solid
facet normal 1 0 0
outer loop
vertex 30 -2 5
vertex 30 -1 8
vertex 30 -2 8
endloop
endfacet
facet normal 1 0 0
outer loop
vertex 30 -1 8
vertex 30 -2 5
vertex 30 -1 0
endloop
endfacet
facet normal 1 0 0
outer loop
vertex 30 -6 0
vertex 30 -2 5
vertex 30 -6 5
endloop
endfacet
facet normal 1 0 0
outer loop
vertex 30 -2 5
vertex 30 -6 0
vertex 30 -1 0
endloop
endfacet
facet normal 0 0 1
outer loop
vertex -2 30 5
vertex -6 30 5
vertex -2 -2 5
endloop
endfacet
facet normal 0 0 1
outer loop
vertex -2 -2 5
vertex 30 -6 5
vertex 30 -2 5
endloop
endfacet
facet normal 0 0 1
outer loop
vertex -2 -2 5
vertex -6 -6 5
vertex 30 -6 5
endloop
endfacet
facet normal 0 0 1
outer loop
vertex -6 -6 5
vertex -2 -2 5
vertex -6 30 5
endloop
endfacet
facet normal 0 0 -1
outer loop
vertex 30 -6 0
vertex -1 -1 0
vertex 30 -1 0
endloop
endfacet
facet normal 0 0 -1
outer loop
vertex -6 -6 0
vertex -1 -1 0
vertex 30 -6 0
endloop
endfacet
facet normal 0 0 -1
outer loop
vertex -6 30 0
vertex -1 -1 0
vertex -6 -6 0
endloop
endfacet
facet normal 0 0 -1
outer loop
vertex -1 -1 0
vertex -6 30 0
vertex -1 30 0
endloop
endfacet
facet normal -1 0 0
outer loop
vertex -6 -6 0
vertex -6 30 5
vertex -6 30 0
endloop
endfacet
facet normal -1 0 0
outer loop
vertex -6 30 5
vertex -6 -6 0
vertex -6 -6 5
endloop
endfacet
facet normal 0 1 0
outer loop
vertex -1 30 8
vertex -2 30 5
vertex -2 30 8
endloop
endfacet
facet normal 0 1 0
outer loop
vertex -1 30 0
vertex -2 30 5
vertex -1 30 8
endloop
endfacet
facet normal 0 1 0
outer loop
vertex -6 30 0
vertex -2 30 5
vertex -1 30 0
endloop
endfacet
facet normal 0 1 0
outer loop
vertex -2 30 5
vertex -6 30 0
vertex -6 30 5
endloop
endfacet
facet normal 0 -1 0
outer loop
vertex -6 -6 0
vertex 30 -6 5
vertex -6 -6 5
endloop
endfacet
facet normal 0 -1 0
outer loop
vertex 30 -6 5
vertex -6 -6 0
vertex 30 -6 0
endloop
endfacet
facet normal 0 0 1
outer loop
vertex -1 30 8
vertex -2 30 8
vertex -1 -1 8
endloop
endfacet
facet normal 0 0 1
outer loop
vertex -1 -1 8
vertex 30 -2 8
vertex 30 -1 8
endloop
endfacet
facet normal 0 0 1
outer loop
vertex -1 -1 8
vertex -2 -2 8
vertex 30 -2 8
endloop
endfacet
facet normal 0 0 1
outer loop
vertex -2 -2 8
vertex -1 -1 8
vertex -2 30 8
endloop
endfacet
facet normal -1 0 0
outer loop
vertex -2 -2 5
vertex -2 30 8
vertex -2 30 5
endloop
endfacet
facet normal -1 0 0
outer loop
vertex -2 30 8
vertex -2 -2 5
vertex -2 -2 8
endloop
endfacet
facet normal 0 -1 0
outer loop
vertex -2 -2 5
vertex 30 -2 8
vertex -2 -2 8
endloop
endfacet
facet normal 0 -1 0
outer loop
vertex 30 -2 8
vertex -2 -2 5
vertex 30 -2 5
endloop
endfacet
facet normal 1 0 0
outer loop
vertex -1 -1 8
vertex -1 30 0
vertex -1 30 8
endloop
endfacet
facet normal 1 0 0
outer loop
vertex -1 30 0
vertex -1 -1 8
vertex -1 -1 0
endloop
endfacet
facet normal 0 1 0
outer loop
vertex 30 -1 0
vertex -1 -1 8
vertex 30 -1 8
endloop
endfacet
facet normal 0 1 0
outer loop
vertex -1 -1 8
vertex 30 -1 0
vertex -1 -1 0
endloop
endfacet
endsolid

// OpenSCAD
// file: Mendel90.scad
//
// QP_OpenSCAD_lib
//
// GNU GPL v3
// quackingplums@gmail.com
//
// Mendel90 dimensions, etc
//

IKEA_SORLI = ["IKEA SÖRLI", 196, 196, 18];

function build_plate_name(build_plate) = build_plate[0];
function build_plate_x(build_plate) = build_plate[1];		// width
function build_plate_y(build_plate) = build_plate[2];		// depth
function build_plate_cr(build_plate) = build_plate[3];		// corner radius

default_build_plate = IKEA_SORLI;

function max_width(build_plate = default_build_plate) = 
	build_plate_x(build_plate);

function max_depth(build_plate = default_build_plate) = 
	build_plate_y(build_plate);

function max_diagonal(build_plate = default_build_plate) = 
	sqrt(
		pow(build_plate_x(build_plate) - 2*build_plate_cr(build_plate), 2) +
		pow(build_plate_y(build_plate) - 2*build_plate_cr(build_plate), 2)
	) + 2*build_plate_cr(build_plate);

module show_build_area(build_plate = default_build_plate)
{
	%	// transparency modifier - doesn't print
	hull()
	{
		translate([build_plate_x(build_plate)/2 - build_plate_cr(build_plate), build_plate_y(build_plate)/2 - build_plate_cr(build_plate), -1])
			cylinder(h = 1, r = build_plate_cr(build_plate));
		translate([-build_plate_x(build_plate)/2 + build_plate_cr(build_plate), build_plate_y(build_plate)/2 - build_plate_cr(build_plate), -1])
			cylinder(h = 1, r = build_plate_cr(build_plate));
		translate([-build_plate_x(build_plate)/2 + build_plate_cr(build_plate), -build_plate_y(build_plate)/2 + build_plate_cr(build_plate), -1])
			cylinder(h = 1, r = build_plate_cr(build_plate));
		translate([build_plate_x(build_plate)/2 - build_plate_cr(build_plate), -build_plate_y(build_plate)/2 + build_plate_cr(build_plate), -1])
			cylinder(h = 1, r = build_plate_cr(build_plate));
	}
}

module show_M90_build_area()
{
	show_build_area(build_area = IKEA_SORLI);
}

//echo(max_diagonal());
// file: common.scad
//
// QP_OpenSCAD_lib
//
// GNU GPL v3
// quackingplums@gmail.com
//
// Useful tools and utilities
//
use <Mendel90.scad>;

/*
module position(translate = [], rotate = [], colour = -1)
Rotate, translate and colour an arbitrary list of objects. In that order
translate		coordinate vector
rotate    		axis angles
colour   		any valid w3/css3 colour name

module show_build_area(x = 196, y = 196, corner_radius = 18)
Draw (non-printing) build platform template
Useful for plating up objects.
Default to Mendel90 with IKEA SÖRLI mirror tile.
x				x dimension
y				y dimension
corner_radius	20mm for SÖRLI

module slot(length, width, depth)
Subtractive rounded-end slot shape to fit within given dimensions
length			length of slot including radii
width			width of slot
depth			depth of slot
*/


module position(translate = [], rotate = [], mirror = [0, 0, 0], colour = -1)
{
	for (i = [0 : $children-1])
		translate(translate)
			rotate(rotate)
				mirror(mirror)
					if (colour == -1)
						children(i);
					else
						color(colour)
							children(i);
}

module show_build_area(x = 196, y = 196, corner_radius = 18)
{
	echo("DEPRECATED: show_build_area() is now in Mendel90.scad and will be removed from common.scad in a future version.");
	show_M90_build_area();
}

module slot(length, width, depth)
{
	hull()
	{
		cylinder(h = depth, r = width/2);
		translate([length - width, 0, 0])
			cylinder(h = depth, r = width/2);
	}
}

function rms(a, b) = 
	sqrt(pow(a, 2) + pow(b, 2));
// main file
/**************************************************
| Baffles can reduce the lifting at sharp corners
| and edges, especially when printing near the edge
| of the heated bed where colder air can reduce
| adhesion.
**************************************************/
use <common.scad>;
ff = 0.05;
$fn = 24;

default_extrusion_width = 0.5;
default_layer_height = 0.2;

default_base_width = 5.0;

// ***** examples *****
%cube(30);
//straight_baffle(length = 30, height = 8);
corner_baffle(length_x = 30, length_y = 30, height = 8);

module straight_baffle(length, height, base_width = default_base_width, ew = default_extrusion_width, lh = default_layer_height)
{
	position(
		mirror = [0, 1, 0],
		translate = [0, -1, 0])
		union()
		{
			// base
			cube([length, base_width, 5]);

			// baffle
			cube([length, 2*ew, height]);
		}
}

module corner_baffle(length_x, length_y, height, base_width = default_base_width, ew = default_extrusion_width, lh = default_layer_height)
{
	difference()
	{
		// corner baffle
		union()
		{
			// base
			translate([-base_width - 1, - base_width - 1, 0])
				cube([length_x + base_width + 1, length_y + base_width + 1, 5]);

			// baffle
			translate([-2, -2, 0])
				cube([length_x + 2, length_y + 2, height]);
		}

		// square object
		translate([-1, -1, -ff/2])
			cube([length_x+1+ff, length_y+1+ff, height+ff]);
	}
}
